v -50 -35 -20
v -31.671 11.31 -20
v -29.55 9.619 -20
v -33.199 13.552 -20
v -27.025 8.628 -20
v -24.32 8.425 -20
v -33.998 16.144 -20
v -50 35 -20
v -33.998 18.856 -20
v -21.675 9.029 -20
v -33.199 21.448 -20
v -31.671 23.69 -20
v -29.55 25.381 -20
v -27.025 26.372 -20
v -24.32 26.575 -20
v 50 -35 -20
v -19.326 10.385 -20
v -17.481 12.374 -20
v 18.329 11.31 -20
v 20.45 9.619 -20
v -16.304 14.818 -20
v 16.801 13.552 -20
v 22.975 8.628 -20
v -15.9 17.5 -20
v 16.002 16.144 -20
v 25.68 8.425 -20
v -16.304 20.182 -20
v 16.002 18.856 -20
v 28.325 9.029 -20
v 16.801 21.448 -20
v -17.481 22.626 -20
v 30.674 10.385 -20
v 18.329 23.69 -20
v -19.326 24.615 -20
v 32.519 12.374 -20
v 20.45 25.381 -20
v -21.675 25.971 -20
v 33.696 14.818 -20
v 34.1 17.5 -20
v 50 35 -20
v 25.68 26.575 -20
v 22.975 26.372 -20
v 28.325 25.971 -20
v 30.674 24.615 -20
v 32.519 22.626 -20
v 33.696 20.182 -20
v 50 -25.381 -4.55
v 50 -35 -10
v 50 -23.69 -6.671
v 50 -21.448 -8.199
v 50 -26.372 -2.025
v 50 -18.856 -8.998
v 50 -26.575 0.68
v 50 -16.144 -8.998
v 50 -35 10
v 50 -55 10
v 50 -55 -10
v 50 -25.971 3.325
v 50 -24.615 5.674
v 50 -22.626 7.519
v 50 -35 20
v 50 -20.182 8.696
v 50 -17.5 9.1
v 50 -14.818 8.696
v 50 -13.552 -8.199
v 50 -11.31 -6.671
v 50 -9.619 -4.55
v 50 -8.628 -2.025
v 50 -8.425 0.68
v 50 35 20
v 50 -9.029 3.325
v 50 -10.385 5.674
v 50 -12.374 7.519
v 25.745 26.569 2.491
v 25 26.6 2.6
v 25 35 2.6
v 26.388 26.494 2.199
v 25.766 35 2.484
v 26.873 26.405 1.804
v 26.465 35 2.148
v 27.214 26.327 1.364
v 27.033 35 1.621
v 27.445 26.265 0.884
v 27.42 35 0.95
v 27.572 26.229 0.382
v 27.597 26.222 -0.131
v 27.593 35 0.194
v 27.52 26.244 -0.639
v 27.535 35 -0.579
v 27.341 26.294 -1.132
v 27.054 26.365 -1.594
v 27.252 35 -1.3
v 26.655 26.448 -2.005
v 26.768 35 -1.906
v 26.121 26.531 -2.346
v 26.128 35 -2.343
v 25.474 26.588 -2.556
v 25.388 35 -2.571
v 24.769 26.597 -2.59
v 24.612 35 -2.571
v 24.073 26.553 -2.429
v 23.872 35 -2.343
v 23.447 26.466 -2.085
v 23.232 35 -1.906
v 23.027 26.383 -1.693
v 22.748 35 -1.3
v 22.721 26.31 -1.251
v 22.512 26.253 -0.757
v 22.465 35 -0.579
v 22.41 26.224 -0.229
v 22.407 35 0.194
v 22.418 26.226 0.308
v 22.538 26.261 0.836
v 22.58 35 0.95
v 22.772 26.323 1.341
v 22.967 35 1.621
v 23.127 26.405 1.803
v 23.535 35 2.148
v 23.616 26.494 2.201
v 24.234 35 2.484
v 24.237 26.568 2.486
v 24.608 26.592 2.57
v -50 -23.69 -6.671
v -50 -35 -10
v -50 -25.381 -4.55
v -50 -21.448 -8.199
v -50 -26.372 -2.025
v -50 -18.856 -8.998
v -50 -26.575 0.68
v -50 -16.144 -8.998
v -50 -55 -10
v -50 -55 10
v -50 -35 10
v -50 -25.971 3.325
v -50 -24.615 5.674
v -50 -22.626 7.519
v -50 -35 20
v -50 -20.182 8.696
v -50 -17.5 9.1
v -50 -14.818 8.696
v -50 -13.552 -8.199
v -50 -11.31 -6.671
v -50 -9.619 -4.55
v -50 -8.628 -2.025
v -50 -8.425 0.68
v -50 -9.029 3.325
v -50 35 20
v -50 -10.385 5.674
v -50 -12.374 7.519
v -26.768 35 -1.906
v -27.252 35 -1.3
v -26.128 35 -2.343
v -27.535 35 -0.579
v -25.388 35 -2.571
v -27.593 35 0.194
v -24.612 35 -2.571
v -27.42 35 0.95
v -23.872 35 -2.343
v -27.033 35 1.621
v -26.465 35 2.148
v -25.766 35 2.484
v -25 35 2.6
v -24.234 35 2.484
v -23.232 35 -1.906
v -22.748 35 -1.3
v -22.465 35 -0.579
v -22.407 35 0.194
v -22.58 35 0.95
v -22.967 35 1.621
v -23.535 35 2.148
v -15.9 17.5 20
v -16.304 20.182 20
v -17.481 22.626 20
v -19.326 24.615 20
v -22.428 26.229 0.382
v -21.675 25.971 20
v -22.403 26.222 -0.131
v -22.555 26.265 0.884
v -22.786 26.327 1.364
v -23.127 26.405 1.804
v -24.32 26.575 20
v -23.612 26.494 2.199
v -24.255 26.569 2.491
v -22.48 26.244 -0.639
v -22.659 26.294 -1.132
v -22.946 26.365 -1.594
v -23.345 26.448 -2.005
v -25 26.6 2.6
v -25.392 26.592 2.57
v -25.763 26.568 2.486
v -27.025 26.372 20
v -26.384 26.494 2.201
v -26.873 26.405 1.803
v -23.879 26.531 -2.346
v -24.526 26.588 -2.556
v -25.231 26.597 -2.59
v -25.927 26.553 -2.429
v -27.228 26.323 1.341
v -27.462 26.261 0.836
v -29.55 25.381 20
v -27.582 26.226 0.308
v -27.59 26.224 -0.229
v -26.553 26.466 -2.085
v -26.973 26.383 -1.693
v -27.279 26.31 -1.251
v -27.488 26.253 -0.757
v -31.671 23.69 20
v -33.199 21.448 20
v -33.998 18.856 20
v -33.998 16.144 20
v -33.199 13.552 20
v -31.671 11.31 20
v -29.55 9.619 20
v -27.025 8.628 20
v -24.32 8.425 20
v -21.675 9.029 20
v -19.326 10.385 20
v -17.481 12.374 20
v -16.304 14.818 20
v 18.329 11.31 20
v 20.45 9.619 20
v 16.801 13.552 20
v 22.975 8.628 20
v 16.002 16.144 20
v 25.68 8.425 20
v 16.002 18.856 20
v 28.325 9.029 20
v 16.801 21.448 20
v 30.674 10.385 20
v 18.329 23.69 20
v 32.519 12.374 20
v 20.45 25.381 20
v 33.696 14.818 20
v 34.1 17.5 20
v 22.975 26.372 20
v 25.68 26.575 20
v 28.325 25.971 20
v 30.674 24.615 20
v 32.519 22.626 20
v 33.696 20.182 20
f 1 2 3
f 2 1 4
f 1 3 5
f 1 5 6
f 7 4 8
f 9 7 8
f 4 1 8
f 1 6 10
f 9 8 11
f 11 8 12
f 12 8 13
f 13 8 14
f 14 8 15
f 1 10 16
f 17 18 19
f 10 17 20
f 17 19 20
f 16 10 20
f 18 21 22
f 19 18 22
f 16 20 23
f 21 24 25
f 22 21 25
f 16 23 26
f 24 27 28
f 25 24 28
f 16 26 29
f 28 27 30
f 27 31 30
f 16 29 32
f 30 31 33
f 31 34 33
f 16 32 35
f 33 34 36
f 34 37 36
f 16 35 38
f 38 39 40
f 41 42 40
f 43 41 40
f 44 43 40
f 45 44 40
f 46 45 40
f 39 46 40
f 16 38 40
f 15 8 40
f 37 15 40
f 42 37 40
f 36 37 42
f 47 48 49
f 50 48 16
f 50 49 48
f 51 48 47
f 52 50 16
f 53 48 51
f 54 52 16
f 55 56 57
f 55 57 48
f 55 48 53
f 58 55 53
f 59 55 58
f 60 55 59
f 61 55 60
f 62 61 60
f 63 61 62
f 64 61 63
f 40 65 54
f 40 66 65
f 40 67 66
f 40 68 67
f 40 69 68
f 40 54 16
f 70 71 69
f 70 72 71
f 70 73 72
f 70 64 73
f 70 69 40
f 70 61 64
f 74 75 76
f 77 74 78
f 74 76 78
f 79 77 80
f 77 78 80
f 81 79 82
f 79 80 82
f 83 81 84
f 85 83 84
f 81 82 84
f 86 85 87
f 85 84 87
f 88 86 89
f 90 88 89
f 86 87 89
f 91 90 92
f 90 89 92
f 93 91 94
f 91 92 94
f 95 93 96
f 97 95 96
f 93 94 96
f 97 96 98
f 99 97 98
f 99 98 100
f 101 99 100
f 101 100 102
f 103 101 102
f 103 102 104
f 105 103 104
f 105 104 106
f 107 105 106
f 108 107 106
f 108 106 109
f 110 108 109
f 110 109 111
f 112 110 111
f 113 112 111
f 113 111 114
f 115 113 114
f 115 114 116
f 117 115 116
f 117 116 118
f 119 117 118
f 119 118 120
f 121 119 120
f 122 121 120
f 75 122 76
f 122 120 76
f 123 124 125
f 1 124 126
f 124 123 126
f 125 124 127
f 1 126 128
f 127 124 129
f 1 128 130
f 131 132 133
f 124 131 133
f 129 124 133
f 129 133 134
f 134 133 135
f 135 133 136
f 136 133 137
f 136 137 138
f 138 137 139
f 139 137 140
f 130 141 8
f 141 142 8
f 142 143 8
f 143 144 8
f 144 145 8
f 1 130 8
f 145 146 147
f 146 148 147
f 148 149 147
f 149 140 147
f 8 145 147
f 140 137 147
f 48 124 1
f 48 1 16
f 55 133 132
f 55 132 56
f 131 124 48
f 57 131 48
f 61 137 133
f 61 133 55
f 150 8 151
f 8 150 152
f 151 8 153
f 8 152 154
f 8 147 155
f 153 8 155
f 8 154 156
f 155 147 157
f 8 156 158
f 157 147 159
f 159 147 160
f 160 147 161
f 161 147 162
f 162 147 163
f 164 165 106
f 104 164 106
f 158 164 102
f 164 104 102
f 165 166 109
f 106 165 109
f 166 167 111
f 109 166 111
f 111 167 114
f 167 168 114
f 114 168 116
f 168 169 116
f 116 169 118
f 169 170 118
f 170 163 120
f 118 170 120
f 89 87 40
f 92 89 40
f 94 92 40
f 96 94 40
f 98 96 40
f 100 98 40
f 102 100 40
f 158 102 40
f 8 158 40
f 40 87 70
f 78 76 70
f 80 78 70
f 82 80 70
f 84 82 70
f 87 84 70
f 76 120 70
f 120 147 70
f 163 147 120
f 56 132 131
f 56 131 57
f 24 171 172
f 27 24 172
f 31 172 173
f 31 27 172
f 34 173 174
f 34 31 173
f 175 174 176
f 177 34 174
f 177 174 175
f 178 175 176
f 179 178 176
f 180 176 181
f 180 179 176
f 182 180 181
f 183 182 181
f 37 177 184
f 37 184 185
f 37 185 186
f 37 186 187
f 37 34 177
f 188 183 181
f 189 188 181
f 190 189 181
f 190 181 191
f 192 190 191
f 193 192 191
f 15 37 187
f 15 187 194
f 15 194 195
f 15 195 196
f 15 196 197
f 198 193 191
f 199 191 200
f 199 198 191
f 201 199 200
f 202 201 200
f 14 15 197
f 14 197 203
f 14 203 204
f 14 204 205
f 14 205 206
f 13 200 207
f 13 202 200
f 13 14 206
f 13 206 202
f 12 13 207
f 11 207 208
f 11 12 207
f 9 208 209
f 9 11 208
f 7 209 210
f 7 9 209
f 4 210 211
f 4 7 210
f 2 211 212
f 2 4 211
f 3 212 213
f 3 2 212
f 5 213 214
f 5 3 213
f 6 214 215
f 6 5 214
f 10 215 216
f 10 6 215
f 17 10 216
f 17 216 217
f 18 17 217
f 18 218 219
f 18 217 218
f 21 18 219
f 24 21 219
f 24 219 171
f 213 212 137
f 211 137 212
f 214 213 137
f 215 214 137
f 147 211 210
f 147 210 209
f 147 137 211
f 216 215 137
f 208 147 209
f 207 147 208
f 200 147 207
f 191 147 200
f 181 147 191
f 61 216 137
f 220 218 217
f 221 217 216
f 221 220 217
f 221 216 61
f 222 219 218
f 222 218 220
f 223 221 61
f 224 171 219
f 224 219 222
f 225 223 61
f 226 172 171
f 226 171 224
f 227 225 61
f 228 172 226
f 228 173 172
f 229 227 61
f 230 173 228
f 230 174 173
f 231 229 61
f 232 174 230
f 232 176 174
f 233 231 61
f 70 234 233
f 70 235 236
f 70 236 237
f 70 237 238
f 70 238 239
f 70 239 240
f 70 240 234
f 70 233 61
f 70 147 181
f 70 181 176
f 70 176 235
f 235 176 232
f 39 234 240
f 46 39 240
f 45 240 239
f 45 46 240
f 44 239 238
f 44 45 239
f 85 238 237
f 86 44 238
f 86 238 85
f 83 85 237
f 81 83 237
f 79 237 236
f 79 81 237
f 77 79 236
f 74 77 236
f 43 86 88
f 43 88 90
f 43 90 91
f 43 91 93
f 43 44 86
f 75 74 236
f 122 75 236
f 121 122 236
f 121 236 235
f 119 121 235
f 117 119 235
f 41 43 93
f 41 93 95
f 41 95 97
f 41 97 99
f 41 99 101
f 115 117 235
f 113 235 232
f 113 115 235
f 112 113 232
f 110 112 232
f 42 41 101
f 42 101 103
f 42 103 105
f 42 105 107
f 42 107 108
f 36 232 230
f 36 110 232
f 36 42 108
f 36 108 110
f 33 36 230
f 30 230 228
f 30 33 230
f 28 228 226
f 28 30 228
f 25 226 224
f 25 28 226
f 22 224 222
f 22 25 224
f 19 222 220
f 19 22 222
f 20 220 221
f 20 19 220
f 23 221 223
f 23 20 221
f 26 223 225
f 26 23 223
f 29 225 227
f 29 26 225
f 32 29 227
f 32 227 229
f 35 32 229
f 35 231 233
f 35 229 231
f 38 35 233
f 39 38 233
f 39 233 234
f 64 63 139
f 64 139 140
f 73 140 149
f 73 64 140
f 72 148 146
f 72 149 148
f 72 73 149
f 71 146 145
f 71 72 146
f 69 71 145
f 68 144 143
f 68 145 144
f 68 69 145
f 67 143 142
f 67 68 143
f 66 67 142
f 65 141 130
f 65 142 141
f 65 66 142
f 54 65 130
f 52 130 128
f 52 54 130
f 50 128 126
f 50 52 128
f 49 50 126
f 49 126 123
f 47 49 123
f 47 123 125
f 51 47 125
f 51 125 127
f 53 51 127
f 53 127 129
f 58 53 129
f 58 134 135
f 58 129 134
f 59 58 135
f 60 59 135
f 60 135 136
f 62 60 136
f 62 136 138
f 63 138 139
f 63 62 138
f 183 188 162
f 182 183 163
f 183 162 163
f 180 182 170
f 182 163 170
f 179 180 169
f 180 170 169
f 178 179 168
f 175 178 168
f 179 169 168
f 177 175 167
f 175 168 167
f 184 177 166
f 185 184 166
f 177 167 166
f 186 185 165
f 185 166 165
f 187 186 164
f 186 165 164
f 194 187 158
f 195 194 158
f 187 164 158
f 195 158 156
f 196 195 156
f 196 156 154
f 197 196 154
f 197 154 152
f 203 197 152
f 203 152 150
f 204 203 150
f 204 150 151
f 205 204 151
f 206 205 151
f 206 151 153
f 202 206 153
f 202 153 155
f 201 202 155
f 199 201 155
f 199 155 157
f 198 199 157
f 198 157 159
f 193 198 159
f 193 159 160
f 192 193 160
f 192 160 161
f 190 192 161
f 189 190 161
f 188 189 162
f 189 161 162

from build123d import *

# Parameters (mm, degrees)
SKETCH1_W               = 100
SKETCH1_H               = 70
BOSS_EXTRUDE1_DEPTH     = 20
CUT_EXTRUDE1_DEPTH      = 73.972597597
CUT_EXTRUDE1_DEPTH_BACK = 73.972597597
SKETCH2_R               = 9.1
CUT_EXTRUDE2_DEPTH      = 108.819293264
CUT_EXTRUDE2_DEPTH_BACK = 108.819293264
SKETCH3_R               = 9.1
SKETCH4_R               = 2.6
CUT_EXTRUDE4_DEPTH      = 20
SKETCH5_W               = 100
SKETCH5_H               = 20
BOSS_EXTRUDE2_DEPTH     = 20


with BuildPart() as part:
    # Sketch1 → Boss-Extrude1 (new, symmetric)
    with BuildSketch(Plane.XY):
        Rectangle(SKETCH1_W, SKETCH1_H)
    extrude(amount=BOSS_EXTRUDE1_DEPTH, both=True)

    # Sketch2 → Cut-Extrude1 (cut, two sides: drawn at the far end of the back side and taken through both)
    with BuildSketch(Plane.XY.offset(20).offset(-CUT_EXTRUDE1_DEPTH_BACK)):
        with Locations((25, 17.5)):
            Circle(SKETCH2_R)
        with Locations((-25, 17.5)):
            Circle(SKETCH2_R)
    extrude(amount=CUT_EXTRUDE1_DEPTH + CUT_EXTRUDE1_DEPTH_BACK, mode=Mode.SUBTRACT)

    # Sketch3 → Cut-Extrude2 (cut, two sides: drawn at the far end of the back side and taken through both)
    with BuildSketch(Plane.ZY.offset(50).offset(-CUT_EXTRUDE2_DEPTH_BACK)):
        with Locations((0, -17.5)):
            Circle(SKETCH3_R)
    extrude(amount=CUT_EXTRUDE2_DEPTH + CUT_EXTRUDE2_DEPTH_BACK, mode=Mode.SUBTRACT)

    # Sketch4 → Cut-Extrude4 (cut)
    with BuildSketch(Plane(origin=(0, 35, 0), x_dir=(1, 0, 0), z_dir=(0, 1, 0))):
        with Locations(Location((-25, 0, 0), (0, 0, 270))):
            Circle(SKETCH4_R)
        with Locations(Location((25, 0, 0), (0, 0, 270))):
            Circle(SKETCH4_R)
    extrude(amount=-CUT_EXTRUDE4_DEPTH, mode=Mode.SUBTRACT)

    # Sketch5 → Boss-Extrude2 (add)
    with BuildSketch(Plane.XZ.offset(35)):
        Rectangle(SKETCH5_W, SKETCH5_H)
    extrude(amount=BOSS_EXTRUDE2_DEPTH)


solid = part.part
